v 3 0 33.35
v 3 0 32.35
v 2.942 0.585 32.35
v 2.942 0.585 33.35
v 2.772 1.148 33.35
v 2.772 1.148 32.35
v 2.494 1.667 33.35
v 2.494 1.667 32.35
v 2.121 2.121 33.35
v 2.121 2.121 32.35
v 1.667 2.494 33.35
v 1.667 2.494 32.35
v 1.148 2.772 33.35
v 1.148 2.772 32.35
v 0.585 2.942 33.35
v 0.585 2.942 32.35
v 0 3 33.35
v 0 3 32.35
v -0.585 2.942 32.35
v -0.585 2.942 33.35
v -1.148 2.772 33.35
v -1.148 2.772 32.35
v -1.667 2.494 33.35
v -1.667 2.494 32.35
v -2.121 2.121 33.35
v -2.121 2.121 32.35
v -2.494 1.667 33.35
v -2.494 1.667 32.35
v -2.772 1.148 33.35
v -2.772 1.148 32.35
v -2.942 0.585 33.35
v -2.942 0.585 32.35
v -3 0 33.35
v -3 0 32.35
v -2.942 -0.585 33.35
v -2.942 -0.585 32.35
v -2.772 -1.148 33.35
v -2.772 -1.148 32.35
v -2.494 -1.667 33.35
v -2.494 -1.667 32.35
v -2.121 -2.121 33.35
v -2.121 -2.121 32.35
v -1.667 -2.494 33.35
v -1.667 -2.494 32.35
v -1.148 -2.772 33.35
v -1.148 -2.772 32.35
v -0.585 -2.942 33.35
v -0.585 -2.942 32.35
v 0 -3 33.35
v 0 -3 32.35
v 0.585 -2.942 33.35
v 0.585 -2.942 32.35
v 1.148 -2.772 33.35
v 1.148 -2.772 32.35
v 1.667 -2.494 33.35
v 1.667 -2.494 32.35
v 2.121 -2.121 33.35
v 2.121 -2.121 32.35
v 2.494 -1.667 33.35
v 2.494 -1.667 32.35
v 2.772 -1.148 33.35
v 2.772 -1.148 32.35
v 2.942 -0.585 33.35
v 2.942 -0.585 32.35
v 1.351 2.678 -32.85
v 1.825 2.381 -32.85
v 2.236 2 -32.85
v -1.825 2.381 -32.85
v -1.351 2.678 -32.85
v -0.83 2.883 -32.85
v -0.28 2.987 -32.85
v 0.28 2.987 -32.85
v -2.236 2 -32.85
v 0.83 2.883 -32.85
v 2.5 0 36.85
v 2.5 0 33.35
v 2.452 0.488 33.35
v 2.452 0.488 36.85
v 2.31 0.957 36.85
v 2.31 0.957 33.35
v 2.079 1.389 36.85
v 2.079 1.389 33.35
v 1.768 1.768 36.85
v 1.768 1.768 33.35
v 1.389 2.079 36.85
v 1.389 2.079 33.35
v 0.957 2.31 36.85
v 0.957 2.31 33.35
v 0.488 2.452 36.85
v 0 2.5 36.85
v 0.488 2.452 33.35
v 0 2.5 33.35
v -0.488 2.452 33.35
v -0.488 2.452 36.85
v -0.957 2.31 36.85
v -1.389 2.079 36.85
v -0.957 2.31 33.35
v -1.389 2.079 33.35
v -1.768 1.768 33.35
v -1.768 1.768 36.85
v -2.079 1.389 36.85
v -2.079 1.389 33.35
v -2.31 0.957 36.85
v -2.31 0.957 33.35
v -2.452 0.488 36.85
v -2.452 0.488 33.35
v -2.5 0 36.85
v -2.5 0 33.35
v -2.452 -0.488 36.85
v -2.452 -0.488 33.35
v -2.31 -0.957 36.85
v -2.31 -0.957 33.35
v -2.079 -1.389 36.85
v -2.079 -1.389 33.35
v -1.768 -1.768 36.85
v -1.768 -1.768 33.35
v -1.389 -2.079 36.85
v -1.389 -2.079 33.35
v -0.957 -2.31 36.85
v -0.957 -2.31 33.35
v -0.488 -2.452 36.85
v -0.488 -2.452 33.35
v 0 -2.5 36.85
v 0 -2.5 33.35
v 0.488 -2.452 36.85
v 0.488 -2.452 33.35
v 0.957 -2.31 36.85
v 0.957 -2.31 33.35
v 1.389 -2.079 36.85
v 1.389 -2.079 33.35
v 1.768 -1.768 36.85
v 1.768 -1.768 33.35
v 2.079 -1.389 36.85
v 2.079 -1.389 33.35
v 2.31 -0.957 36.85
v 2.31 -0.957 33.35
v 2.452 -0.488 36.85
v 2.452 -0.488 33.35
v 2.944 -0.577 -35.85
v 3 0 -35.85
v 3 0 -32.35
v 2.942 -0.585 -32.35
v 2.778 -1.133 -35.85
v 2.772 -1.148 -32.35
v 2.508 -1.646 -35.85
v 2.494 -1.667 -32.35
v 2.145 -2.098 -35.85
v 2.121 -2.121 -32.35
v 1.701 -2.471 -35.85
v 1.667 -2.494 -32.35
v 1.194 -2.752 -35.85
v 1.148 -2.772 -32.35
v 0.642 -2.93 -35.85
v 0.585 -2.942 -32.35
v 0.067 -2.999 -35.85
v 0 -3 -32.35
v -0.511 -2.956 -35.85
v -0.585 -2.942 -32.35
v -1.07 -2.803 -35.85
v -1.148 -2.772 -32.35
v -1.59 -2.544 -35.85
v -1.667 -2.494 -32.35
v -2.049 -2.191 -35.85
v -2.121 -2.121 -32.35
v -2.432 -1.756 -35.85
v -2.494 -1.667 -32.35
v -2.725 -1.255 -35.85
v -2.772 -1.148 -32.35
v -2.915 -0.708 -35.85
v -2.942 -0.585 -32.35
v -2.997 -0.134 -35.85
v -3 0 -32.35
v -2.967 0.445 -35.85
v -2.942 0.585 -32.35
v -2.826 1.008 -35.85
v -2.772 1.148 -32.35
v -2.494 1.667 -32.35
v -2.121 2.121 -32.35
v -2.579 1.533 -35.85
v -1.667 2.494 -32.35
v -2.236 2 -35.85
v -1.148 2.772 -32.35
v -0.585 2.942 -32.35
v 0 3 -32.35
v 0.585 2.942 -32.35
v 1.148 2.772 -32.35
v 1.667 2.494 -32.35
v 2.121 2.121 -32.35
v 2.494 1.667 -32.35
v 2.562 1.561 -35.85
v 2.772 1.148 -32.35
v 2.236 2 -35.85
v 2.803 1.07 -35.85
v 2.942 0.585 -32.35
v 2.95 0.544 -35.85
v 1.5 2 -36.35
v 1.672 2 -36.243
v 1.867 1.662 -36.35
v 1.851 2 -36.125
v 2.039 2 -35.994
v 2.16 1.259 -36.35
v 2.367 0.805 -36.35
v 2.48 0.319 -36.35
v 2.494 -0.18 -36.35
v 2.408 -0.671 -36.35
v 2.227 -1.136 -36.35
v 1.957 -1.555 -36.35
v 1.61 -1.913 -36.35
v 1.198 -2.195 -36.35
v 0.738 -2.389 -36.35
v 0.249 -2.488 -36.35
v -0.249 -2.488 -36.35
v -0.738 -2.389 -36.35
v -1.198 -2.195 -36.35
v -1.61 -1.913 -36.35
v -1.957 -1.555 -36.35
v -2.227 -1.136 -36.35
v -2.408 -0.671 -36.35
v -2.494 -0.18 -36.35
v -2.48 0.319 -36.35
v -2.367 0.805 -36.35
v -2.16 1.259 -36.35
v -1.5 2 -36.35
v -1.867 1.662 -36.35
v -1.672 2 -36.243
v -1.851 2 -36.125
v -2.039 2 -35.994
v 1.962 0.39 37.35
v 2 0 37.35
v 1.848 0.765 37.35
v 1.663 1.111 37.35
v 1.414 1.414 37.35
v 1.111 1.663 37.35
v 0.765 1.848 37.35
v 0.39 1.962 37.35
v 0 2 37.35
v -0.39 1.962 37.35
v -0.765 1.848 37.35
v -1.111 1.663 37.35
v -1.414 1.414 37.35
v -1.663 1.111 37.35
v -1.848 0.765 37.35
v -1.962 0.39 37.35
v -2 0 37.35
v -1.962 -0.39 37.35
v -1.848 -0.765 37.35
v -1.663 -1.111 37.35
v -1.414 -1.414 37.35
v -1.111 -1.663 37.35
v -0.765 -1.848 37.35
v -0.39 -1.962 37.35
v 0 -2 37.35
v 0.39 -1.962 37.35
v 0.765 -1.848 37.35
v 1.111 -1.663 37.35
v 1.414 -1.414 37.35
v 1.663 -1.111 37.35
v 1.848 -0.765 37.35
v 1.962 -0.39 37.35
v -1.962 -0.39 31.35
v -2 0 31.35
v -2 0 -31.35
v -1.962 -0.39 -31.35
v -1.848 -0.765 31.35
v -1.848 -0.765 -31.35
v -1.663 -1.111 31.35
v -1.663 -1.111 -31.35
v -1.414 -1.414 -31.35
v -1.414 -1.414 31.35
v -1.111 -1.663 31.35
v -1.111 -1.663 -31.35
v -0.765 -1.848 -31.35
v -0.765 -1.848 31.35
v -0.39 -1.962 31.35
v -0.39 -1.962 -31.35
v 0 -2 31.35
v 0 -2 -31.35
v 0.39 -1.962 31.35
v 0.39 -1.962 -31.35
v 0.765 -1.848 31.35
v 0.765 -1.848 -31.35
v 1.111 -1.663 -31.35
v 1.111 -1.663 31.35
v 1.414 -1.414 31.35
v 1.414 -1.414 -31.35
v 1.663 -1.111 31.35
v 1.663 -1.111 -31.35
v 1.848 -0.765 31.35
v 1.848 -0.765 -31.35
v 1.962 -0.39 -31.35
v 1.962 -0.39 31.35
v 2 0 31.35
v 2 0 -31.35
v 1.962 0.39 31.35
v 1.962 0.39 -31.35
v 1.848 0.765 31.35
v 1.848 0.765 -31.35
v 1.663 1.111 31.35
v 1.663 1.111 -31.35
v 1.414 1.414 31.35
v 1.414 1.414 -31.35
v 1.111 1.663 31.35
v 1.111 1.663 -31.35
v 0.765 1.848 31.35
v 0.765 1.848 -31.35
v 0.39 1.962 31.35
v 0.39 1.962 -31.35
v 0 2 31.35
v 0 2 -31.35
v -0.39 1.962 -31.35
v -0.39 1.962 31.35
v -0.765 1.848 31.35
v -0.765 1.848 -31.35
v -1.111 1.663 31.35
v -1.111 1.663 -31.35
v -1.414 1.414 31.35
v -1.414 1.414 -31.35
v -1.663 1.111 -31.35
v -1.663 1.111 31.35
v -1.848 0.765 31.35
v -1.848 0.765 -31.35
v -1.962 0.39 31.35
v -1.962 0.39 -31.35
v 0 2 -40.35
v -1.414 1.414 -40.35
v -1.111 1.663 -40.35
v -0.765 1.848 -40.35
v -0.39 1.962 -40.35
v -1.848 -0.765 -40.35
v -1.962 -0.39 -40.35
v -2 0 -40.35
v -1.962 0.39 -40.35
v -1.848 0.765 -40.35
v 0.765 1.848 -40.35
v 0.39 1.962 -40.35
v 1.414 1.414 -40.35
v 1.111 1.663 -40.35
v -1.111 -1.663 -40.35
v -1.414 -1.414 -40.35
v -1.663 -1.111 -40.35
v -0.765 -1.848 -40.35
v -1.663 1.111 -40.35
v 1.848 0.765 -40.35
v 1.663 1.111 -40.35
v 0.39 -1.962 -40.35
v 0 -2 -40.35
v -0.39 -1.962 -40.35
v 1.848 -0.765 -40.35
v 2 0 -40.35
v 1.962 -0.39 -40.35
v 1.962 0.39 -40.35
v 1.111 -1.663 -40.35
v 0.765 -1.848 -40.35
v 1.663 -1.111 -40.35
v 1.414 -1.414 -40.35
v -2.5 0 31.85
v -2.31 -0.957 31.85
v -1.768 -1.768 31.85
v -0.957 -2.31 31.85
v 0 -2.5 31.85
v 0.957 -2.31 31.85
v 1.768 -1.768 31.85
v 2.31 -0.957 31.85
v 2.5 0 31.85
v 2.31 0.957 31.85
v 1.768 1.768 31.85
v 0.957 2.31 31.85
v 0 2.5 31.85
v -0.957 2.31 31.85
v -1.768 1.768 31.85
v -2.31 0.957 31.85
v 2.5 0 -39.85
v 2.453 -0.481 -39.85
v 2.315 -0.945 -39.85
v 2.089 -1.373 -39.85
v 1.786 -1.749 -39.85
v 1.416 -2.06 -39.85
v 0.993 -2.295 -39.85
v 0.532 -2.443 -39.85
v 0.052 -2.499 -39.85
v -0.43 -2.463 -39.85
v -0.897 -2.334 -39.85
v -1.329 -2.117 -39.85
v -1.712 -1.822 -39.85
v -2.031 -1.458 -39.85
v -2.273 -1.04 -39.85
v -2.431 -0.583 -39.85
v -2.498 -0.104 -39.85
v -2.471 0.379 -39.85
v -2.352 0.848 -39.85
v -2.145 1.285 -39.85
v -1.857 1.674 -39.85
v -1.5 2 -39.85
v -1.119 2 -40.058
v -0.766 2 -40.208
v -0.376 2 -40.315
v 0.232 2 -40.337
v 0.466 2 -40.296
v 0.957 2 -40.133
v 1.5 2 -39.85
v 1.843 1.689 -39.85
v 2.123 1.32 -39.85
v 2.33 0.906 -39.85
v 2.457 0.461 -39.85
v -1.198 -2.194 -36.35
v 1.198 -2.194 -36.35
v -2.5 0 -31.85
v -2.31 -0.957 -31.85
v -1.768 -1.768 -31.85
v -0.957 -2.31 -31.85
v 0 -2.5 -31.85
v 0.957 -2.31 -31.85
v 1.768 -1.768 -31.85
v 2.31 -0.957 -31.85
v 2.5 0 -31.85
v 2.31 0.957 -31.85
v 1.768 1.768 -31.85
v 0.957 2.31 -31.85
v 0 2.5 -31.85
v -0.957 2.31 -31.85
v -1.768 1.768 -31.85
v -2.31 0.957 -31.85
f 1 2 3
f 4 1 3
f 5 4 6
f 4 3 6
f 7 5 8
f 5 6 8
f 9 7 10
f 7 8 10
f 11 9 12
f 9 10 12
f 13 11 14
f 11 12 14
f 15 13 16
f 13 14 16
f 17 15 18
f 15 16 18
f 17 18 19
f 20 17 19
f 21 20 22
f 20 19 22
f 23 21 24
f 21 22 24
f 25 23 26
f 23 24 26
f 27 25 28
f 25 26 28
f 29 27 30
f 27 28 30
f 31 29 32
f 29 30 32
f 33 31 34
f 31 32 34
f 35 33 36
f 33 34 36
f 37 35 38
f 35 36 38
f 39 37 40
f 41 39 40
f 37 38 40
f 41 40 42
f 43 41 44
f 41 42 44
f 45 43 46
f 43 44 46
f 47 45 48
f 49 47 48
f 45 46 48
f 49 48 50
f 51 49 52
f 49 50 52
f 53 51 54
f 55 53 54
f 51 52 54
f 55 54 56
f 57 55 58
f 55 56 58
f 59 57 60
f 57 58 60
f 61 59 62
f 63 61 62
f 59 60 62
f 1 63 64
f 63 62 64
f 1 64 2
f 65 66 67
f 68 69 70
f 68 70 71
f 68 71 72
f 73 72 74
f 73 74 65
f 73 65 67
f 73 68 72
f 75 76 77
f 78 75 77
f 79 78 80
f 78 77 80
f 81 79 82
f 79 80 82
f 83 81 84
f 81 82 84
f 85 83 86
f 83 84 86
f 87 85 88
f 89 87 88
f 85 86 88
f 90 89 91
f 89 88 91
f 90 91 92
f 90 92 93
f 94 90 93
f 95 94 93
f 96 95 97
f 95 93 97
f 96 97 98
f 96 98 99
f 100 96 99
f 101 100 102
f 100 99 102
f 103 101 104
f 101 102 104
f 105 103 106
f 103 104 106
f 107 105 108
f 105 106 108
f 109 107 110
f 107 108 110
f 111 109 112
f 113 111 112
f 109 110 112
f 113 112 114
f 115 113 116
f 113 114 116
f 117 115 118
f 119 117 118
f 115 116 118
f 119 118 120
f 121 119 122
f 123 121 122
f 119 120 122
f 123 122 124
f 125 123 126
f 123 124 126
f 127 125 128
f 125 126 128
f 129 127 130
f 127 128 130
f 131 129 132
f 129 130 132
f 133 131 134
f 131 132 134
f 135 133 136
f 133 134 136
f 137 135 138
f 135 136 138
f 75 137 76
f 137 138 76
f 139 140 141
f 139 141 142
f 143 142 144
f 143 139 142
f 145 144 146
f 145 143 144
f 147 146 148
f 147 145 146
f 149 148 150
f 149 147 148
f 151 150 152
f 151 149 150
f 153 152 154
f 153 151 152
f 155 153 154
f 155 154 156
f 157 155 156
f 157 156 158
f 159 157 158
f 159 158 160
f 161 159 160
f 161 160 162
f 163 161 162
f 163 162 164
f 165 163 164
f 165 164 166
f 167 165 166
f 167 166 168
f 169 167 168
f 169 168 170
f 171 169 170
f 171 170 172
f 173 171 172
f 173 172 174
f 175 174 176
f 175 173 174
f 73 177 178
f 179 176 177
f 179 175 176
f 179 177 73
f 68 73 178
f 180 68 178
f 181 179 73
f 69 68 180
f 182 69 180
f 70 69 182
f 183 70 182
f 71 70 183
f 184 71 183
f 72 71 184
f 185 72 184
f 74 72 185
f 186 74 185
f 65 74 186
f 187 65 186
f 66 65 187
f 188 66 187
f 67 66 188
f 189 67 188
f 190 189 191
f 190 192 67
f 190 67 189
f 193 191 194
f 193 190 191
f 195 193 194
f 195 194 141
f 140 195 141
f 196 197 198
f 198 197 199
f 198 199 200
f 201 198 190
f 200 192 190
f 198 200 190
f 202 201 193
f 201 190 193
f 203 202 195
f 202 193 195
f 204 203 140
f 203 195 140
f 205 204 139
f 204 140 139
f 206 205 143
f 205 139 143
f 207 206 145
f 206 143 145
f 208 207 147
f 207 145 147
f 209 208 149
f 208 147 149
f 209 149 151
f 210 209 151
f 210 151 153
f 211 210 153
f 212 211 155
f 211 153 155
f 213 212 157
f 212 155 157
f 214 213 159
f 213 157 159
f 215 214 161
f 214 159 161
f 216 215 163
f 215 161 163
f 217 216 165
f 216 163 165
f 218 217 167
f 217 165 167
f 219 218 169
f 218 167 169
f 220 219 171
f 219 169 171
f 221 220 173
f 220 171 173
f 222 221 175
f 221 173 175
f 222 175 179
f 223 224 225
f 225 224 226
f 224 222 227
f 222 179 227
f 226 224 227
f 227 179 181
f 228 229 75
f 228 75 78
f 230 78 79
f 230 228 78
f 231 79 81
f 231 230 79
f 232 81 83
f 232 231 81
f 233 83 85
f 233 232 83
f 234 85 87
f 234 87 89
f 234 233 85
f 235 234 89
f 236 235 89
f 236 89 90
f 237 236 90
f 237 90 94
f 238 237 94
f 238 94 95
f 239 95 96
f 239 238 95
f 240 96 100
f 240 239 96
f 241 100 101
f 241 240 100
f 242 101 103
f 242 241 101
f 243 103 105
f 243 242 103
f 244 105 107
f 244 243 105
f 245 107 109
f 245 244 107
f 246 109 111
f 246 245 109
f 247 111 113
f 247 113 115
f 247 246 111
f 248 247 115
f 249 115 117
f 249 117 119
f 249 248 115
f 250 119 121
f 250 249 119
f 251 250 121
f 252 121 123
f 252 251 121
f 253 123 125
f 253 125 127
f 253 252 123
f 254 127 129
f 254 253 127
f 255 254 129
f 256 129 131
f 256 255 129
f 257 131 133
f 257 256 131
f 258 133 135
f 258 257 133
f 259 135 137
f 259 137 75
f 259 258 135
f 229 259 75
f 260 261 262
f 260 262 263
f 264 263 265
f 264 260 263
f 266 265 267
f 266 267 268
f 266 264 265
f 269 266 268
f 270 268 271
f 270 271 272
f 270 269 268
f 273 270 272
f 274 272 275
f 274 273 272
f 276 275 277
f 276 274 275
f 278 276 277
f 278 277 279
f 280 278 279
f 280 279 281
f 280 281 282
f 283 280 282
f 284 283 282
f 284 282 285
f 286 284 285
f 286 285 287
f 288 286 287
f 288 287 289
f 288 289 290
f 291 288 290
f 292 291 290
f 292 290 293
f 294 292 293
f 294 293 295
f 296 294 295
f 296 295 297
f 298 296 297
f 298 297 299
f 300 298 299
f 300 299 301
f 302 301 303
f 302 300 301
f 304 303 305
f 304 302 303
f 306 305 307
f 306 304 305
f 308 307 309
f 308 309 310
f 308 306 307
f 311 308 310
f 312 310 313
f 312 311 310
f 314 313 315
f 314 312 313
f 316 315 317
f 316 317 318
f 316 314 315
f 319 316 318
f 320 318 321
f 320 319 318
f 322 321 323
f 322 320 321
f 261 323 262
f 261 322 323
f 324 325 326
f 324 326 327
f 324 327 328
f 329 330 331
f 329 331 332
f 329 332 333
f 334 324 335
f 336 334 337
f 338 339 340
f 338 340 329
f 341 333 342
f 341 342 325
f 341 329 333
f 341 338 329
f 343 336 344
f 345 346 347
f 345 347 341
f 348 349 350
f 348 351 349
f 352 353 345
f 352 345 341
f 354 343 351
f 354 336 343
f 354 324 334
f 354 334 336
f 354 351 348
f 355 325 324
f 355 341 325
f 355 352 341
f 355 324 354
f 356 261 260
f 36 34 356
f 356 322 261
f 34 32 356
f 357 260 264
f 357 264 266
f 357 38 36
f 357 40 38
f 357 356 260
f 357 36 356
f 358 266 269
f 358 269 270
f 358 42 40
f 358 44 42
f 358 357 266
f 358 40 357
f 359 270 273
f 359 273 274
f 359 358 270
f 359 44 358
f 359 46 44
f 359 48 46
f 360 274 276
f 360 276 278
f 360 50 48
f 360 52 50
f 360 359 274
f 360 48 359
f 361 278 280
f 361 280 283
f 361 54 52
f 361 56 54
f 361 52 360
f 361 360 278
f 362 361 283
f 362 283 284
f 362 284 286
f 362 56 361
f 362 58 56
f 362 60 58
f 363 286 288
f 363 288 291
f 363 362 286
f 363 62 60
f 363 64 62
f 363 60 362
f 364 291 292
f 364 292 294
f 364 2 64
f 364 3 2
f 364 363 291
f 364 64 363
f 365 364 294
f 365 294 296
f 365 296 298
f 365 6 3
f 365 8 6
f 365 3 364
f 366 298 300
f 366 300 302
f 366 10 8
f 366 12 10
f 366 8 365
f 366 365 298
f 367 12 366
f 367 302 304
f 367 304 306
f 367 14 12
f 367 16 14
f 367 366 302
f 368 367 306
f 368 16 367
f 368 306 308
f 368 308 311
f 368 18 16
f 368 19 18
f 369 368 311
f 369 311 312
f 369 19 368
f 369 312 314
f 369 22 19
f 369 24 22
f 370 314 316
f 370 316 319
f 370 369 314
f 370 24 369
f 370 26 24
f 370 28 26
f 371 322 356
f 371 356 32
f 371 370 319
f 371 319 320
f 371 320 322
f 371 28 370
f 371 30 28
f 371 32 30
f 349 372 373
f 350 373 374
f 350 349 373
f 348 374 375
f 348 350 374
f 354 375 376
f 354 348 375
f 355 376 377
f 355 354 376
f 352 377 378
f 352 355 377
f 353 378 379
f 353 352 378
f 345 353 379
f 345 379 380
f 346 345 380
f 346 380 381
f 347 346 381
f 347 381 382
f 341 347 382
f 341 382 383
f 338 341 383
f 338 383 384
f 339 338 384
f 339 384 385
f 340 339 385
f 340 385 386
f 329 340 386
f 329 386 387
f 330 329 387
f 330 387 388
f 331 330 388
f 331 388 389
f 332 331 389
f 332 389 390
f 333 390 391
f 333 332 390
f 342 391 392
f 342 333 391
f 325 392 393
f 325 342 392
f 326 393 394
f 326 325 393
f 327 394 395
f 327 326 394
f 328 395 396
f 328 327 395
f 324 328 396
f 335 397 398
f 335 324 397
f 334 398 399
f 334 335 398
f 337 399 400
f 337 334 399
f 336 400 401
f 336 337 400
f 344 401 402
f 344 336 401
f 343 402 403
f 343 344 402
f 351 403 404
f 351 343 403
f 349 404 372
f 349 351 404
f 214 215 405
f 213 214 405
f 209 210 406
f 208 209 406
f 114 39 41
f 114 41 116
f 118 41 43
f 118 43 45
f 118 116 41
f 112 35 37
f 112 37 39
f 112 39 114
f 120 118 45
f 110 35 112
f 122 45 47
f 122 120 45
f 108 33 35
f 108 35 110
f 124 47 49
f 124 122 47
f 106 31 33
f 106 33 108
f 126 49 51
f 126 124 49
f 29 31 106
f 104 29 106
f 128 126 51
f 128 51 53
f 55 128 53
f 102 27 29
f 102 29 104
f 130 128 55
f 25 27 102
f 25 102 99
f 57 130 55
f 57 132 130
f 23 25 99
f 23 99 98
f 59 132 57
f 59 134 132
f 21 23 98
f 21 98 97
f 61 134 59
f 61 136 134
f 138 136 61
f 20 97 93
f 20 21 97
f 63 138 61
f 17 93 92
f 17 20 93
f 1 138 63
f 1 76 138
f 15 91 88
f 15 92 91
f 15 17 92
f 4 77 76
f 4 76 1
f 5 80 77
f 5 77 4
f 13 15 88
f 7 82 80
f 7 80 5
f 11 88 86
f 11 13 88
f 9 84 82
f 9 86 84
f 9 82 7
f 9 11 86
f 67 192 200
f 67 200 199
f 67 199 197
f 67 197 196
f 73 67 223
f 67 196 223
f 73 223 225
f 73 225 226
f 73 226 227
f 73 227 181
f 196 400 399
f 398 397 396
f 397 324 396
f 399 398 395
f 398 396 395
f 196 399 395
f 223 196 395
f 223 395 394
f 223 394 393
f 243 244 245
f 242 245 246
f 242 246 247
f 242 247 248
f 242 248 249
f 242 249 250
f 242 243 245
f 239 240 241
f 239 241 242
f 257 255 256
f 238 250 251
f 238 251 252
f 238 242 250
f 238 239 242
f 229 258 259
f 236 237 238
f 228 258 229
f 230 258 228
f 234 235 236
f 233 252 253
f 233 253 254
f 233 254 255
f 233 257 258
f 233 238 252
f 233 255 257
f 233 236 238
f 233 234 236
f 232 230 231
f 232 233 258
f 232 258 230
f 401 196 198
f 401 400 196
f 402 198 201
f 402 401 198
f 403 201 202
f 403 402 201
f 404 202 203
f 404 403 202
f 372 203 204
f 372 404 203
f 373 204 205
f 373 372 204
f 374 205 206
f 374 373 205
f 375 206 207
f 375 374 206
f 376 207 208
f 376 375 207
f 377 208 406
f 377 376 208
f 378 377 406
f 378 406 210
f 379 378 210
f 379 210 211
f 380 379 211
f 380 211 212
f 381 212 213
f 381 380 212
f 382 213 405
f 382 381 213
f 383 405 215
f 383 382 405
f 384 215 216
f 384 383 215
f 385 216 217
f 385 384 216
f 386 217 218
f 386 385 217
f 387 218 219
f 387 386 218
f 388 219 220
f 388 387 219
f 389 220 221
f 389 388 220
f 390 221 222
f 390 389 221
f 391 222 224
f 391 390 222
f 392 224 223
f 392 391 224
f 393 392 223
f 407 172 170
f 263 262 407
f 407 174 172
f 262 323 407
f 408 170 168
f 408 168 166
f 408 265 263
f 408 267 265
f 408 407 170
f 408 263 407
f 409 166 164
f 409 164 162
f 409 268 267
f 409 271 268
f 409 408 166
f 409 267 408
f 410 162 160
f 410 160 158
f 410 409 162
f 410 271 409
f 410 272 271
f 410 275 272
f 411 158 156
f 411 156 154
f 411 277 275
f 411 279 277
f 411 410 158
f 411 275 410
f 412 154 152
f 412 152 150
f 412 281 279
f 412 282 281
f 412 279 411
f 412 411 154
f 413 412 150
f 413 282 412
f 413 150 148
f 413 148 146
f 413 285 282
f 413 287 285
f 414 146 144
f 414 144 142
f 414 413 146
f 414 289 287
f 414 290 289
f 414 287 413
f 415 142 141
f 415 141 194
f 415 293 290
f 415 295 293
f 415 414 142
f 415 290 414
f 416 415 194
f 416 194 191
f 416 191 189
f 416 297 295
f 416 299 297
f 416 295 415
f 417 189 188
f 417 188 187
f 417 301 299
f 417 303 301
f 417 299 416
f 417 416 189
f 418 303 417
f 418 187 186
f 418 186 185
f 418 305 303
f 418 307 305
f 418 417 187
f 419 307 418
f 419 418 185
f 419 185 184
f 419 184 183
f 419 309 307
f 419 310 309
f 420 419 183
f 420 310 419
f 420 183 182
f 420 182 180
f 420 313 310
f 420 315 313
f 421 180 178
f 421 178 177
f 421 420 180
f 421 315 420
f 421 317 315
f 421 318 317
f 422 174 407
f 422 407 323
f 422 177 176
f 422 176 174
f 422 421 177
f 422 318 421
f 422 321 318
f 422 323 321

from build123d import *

# Parameters (mm, degrees)
SKETCH_1_R          = 2
EXTRUDE_1_DEPTH     = 32.35
SKETCH_2_R          = 3
EXTRUDE_2_DEPTH     = 1
SKETCH_3_R          = 2.5
EXTRUDE_3_DEPTH     = 4
EXTRUDE_START       = 4
SKETCH_4_R          = 3
EXTRUDE_4_DEPTH     = 4
SKETCH_5_R          = 2.5
EXTRUDE_5_DEPTH     = 4
CHAMFER_1_SIZE      = 0.5
CHAMFER_2_SIZE      = 0.5
SKETCH_6_W          = 6
SKETCH_6_H          = 3
CUT_EXTRUDE_6_DEPTH = 7.5
CHAMFER1_SIZE       = 1


with BuildPart() as part:
    # 草图1 → 拉伸1 (new, symmetric)
    with BuildSketch(Plane.XY):
        with Locations(Location((0, 0, 0), (0, 0, 180))):
            Circle(SKETCH_1_R)
    extrude(amount=EXTRUDE_1_DEPTH, both=True)

    # 草图2 → 拉伸2 (add)
    with BuildSketch(Plane.XY.offset(32.35)):
        Circle(SKETCH_2_R)
    extrude(amount=EXTRUDE_2_DEPTH)

    # 草图3 → 拉伸3 (add)
    with BuildSketch(Plane.XY.offset(33.35)):
        Circle(SKETCH_3_R)
    extrude(amount=EXTRUDE_3_DEPTH)

    # 草图4 → 拉伸4 (add)
    with BuildSketch(Plane(origin=(0, 0, -32.35), x_dir=(-1, 0, 0), z_dir=(0, 0, -1)).offset(EXTRUDE_START)):
        with Locations(Location((0, 0, 0), (0, 0, 180))):
            Circle(SKETCH_4_R)
    extrude(amount=-EXTRUDE_4_DEPTH)

    # 草图5 → 拉伸5 (add)
    with BuildSketch(Plane(origin=(0, 0, -36.35), x_dir=(-1, 0, 0), z_dir=(0, 0, -1)).offset(EXTRUDE_START)):
        with Locations(Location((0, 0, 0), (0, 0, 180))):
            Circle(SKETCH_5_R)
    extrude(amount=-EXTRUDE_5_DEPTH)

    # 倒角1
    chamfer_1_edges = [part.edges().sort_by_distance(p)[0] for p in [
        (-2.5, 0, 37.35),
        (-2.5, 0, -40.35),
    ]]
    chamfer(chamfer_1_edges, length=CHAMFER_1_SIZE)

    # 倒角2
    chamfer_2_edges = [part.edges().sort_by_distance(p)[0] for p in [
        (-3, 0, -36.35),
    ]]
    chamfer(chamfer_2_edges, length=CHAMFER_2_SIZE - 0.0001)  # a hair under: the kernel refuses the full size

    # 草图6 → 拉伸6 (cut)
    with BuildSketch(Plane(origin=(0, 0, -40.35), x_dir=(-1, 0, 0), z_dir=(0, 0, -1))):
        with Locations((0, 3.5)):
            Rectangle(SKETCH_6_W, SKETCH_6_H)
    extrude(amount=-CUT_EXTRUDE_6_DEPTH, mode=Mode.SUBTRACT)

    # Chamfer1
    chamfer1_edges = [part.edges().sort_by_distance(p)[0] for p in [
        (2, 0, -32.35),
        (2, 0, 32.35),
    ]]
    chamfer(chamfer1_edges, length=CHAMFER1_SIZE - 0.0001)  # a hair under: the kernel refuses the full size


solid = part.part
